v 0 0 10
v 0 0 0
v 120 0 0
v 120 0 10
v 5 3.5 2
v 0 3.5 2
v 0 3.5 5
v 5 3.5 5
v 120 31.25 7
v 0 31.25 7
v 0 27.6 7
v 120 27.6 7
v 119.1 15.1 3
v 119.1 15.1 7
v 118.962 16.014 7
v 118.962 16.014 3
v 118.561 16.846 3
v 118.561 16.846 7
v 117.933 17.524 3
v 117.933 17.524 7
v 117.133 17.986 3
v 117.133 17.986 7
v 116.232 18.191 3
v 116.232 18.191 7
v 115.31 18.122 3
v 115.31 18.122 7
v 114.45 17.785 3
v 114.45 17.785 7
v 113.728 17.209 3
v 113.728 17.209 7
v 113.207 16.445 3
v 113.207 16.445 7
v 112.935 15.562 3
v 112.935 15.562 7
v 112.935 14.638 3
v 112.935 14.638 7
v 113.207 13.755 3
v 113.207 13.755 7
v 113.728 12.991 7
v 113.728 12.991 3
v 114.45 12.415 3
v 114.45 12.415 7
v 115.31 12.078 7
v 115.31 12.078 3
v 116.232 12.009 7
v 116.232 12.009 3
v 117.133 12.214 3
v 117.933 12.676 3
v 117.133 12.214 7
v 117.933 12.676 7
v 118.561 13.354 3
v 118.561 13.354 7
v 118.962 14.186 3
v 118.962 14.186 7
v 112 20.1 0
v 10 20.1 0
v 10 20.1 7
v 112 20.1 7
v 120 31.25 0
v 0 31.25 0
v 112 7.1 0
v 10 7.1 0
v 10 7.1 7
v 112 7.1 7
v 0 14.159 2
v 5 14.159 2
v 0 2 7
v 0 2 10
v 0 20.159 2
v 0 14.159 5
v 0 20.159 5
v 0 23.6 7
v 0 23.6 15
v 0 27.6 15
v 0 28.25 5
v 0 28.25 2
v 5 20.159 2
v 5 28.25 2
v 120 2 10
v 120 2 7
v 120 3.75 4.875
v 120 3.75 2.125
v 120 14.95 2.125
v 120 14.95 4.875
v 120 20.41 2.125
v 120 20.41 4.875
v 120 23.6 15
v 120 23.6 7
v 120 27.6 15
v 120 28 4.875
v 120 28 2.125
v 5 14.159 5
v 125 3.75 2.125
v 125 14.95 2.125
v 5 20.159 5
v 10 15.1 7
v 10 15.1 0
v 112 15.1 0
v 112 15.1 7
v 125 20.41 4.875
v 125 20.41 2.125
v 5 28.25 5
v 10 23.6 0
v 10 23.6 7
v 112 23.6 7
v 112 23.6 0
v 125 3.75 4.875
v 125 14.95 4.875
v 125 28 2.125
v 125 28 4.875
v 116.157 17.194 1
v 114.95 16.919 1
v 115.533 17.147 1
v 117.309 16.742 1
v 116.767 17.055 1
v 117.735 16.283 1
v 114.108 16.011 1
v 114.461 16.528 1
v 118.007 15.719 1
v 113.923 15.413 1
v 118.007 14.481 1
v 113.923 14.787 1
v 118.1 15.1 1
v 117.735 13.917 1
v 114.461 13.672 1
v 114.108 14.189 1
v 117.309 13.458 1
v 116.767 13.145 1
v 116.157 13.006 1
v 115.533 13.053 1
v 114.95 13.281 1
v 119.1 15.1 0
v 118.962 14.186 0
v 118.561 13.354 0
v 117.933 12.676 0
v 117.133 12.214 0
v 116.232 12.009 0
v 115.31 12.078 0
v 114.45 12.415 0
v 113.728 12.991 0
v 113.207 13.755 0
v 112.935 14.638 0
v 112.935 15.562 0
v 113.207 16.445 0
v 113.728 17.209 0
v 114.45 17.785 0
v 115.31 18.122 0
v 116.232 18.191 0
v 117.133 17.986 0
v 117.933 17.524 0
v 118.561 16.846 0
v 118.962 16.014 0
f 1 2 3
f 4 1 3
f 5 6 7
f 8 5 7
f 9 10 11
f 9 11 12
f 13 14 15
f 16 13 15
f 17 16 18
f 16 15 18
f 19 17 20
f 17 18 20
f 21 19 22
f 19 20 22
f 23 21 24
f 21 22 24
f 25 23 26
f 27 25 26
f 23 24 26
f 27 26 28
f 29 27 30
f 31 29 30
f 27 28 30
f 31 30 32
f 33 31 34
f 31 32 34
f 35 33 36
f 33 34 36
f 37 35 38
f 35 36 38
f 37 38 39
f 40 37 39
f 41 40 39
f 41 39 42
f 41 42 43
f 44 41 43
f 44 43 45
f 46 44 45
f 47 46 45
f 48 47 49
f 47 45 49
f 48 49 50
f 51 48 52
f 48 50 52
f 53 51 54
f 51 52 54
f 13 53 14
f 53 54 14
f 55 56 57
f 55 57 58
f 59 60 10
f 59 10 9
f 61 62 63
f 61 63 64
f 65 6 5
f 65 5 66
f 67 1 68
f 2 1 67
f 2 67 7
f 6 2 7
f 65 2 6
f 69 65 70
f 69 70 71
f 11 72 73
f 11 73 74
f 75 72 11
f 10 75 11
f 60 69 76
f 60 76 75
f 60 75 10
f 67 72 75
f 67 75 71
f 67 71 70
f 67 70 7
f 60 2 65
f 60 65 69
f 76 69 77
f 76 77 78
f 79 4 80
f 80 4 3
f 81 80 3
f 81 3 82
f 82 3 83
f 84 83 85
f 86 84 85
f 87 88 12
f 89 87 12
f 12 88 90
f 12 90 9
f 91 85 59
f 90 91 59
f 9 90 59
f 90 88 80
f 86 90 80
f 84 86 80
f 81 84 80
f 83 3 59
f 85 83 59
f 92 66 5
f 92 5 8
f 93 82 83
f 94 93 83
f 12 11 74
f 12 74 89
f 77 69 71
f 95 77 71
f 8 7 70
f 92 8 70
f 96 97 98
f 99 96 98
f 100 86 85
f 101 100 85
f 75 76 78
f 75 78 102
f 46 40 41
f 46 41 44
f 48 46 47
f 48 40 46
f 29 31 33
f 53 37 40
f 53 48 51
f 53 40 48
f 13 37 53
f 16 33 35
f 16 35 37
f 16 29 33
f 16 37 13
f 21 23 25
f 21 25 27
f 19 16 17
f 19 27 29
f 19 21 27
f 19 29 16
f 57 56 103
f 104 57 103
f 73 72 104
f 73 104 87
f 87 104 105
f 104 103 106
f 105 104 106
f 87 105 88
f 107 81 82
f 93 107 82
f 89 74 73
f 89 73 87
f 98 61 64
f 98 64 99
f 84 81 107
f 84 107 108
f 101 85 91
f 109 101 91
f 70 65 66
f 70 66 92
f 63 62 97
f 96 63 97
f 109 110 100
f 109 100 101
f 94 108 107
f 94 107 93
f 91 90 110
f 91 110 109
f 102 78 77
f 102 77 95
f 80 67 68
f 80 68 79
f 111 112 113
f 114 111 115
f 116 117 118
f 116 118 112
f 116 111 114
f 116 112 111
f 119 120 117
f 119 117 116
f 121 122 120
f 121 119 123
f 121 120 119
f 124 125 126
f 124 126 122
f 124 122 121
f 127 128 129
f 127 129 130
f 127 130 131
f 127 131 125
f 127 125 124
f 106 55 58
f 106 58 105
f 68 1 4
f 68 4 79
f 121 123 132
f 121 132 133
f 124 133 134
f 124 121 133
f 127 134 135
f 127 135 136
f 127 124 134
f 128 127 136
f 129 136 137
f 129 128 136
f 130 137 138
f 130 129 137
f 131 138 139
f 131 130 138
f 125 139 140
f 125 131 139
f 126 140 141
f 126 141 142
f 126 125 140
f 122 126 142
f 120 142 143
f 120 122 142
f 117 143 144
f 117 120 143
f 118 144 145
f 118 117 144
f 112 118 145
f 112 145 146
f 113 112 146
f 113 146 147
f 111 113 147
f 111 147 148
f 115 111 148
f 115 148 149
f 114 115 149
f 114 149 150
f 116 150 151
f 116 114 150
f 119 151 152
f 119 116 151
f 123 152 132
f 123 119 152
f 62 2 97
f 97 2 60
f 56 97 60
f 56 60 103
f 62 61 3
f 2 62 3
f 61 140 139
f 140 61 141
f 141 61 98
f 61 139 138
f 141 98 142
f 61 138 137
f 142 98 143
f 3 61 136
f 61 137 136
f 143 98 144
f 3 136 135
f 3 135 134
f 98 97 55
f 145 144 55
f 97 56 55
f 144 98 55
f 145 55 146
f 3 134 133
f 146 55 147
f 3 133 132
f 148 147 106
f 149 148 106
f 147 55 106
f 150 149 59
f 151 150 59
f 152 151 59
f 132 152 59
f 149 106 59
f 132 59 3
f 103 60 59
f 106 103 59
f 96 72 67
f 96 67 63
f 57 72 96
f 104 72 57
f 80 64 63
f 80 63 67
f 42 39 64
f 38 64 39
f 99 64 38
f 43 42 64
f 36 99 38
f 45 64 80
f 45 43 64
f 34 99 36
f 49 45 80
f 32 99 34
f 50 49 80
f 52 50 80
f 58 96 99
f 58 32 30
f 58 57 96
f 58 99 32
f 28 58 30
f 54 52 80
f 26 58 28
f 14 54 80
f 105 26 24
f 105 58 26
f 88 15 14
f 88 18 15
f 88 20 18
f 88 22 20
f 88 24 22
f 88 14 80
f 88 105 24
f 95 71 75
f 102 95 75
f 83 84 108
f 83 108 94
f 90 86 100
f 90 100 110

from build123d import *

# Parameters (mm, degrees)
SKETCH1_W               = 120
SKETCH1_H               = 31.25
BOSS_EXTRUDE1_DEPTH     = 7
SKETCH2_W               = 120
SKETCH2_H               = 4
SKETCH2_H_2             = 2
BOSS_EXTRUDE2_DEPTH     = 8
CUT_EXTRUDE1_DEPTH      = 125.260059955
CUT_EXTRUDE1_DEPTH_BACK = 125.260059955
SKETCH3_W               = 102
SKETCH3_H               = 8
SKETCH3_H_2             = 3.5
CUT_EXTRUDE3_REACH      = 126.906
SKETCH6_W               = 5
SKETCH6_H               = 2
SKETCH4_W               = 3
SKETCH4_H               = 8.090611825
SKETCH4_H_2             = 10.659388175
CUT_EXTRUDE4_DEPTH      = 5
SKETCH5_W               = 2.75
SKETCH5_H               = 7.59
SKETCH5_H_2             = 11.2
BOSS_EXTRUDE3_DEPTH     = 5
SKETCH7_R               = 3.1
CUT_EXTRUDE5_DEPTH      = 4
CUT_EXTRUDE6_START      = -1
SKETCH8_R               = 3.1
CUT_EXTRUDE6_DEPTH      = 1
CHAMFER1_SIZE           = 1


with BuildPart() as part:
    # Sketch1 → Boss-Extrude1 (new body)
    with BuildSketch(Plane.XY):
        with Locations((60, 15.625)):
            Rectangle(SKETCH1_W, SKETCH1_H)
    extrude(amount=BOSS_EXTRUDE1_DEPTH)

    # Sketch2 → Boss-Extrude2 (add)
    with BuildSketch(Plane.XY.offset(7)):
        with Locations((60, 25.6)):
            Rectangle(SKETCH2_W, SKETCH2_H)
        with Locations((60, 1)):
            Rectangle(SKETCH2_W, SKETCH2_H_2)
    extrude(amount=BOSS_EXTRUDE2_DEPTH)

    # Sketch3 → Cut-Extrude1 (cut, two sides: drawn at the far end of the back side and taken through both)
    with BuildSketch(Plane.XY.offset(7).offset(-CUT_EXTRUDE1_DEPTH_BACK)):
        with Locations((61, 11.1)):
            Rectangle(SKETCH3_W, SKETCH3_H)
        with Locations((61, 21.85)):
            Rectangle(SKETCH3_W, SKETCH3_H_2)
    extrude(amount=CUT_EXTRUDE1_DEPTH + CUT_EXTRUDE1_DEPTH_BACK, mode=Mode.SUBTRACT)

    # Sketch6 → Cut-Extrude3 (cut, up to next)
    with BuildSketch(Plane.ZY, mode=Mode.PRIVATE) as cut_extrude3_sk1:
        with Locations((12.5, 1)):
            Rectangle(SKETCH6_W, SKETCH6_H)
    cut_extrude3_tool1 = extrude(cut_extrude3_sk1.sketch, amount=-CUT_EXTRUDE3_REACH, mode=Mode.PRIVATE) & part.part
    add(cut_extrude3_tool1.solids().sort_by_distance((0, 1, 12.5))[0], mode=Mode.SUBTRACT)

    # Sketch4 → Cut-Extrude4 (cut)
    with BuildSketch(Plane.ZY):
        with Locations((3.5, 24.204694088)):
            Rectangle(SKETCH4_W, SKETCH4_H)
        with Locations((3.5, 8.829694088)):
            Rectangle(SKETCH4_W, SKETCH4_H_2)
    extrude(amount=-CUT_EXTRUDE4_DEPTH, mode=Mode.SUBTRACT)

    # Sketch5 → Boss-Extrude3 (add)
    with BuildSketch(Plane(origin=(120, 0, 0), x_dir=(0, 0, -1), z_dir=(1, 0, 0))):
        with Locations((-3.5, 24.205)):
            Rectangle(SKETCH5_W, SKETCH5_H)
        with Locations((-3.5, 9.35)):
            Rectangle(SKETCH5_W, SKETCH5_H_2)
    extrude(amount=BOSS_EXTRUDE3_DEPTH)

    # Sketch7 → Cut-Extrude5 (cut)
    with BuildSketch(Plane.XY.offset(7)):
        with Locations((116, 15.1)):
            Circle(SKETCH7_R)
    extrude(amount=-CUT_EXTRUDE5_DEPTH, mode=Mode.SUBTRACT)

    # Sketch8 → Cut-Extrude6 (cut)
    with BuildSketch(Plane(origin=(0, 0, 0), x_dir=(-1, 0, 0), z_dir=(0, 0, -1)).offset(CUT_EXTRUDE6_START)):
        with Locations(Location((-116, 15.1, 0), (0, 0, 180))):
            Circle(SKETCH8_R)
    extrude(amount=CUT_EXTRUDE6_DEPTH, mode=Mode.SUBTRACT)

    # Chamfer1
    chamfer1_edges = [part.edges().sort_by_distance(p)[0] for p in [
        (112.9, 15.1, 1),
    ]]
    chamfer(chamfer1_edges, length=CHAMFER1_SIZE - 0.0001)  # a hair under: the kernel refuses the full size


solid = part.part
